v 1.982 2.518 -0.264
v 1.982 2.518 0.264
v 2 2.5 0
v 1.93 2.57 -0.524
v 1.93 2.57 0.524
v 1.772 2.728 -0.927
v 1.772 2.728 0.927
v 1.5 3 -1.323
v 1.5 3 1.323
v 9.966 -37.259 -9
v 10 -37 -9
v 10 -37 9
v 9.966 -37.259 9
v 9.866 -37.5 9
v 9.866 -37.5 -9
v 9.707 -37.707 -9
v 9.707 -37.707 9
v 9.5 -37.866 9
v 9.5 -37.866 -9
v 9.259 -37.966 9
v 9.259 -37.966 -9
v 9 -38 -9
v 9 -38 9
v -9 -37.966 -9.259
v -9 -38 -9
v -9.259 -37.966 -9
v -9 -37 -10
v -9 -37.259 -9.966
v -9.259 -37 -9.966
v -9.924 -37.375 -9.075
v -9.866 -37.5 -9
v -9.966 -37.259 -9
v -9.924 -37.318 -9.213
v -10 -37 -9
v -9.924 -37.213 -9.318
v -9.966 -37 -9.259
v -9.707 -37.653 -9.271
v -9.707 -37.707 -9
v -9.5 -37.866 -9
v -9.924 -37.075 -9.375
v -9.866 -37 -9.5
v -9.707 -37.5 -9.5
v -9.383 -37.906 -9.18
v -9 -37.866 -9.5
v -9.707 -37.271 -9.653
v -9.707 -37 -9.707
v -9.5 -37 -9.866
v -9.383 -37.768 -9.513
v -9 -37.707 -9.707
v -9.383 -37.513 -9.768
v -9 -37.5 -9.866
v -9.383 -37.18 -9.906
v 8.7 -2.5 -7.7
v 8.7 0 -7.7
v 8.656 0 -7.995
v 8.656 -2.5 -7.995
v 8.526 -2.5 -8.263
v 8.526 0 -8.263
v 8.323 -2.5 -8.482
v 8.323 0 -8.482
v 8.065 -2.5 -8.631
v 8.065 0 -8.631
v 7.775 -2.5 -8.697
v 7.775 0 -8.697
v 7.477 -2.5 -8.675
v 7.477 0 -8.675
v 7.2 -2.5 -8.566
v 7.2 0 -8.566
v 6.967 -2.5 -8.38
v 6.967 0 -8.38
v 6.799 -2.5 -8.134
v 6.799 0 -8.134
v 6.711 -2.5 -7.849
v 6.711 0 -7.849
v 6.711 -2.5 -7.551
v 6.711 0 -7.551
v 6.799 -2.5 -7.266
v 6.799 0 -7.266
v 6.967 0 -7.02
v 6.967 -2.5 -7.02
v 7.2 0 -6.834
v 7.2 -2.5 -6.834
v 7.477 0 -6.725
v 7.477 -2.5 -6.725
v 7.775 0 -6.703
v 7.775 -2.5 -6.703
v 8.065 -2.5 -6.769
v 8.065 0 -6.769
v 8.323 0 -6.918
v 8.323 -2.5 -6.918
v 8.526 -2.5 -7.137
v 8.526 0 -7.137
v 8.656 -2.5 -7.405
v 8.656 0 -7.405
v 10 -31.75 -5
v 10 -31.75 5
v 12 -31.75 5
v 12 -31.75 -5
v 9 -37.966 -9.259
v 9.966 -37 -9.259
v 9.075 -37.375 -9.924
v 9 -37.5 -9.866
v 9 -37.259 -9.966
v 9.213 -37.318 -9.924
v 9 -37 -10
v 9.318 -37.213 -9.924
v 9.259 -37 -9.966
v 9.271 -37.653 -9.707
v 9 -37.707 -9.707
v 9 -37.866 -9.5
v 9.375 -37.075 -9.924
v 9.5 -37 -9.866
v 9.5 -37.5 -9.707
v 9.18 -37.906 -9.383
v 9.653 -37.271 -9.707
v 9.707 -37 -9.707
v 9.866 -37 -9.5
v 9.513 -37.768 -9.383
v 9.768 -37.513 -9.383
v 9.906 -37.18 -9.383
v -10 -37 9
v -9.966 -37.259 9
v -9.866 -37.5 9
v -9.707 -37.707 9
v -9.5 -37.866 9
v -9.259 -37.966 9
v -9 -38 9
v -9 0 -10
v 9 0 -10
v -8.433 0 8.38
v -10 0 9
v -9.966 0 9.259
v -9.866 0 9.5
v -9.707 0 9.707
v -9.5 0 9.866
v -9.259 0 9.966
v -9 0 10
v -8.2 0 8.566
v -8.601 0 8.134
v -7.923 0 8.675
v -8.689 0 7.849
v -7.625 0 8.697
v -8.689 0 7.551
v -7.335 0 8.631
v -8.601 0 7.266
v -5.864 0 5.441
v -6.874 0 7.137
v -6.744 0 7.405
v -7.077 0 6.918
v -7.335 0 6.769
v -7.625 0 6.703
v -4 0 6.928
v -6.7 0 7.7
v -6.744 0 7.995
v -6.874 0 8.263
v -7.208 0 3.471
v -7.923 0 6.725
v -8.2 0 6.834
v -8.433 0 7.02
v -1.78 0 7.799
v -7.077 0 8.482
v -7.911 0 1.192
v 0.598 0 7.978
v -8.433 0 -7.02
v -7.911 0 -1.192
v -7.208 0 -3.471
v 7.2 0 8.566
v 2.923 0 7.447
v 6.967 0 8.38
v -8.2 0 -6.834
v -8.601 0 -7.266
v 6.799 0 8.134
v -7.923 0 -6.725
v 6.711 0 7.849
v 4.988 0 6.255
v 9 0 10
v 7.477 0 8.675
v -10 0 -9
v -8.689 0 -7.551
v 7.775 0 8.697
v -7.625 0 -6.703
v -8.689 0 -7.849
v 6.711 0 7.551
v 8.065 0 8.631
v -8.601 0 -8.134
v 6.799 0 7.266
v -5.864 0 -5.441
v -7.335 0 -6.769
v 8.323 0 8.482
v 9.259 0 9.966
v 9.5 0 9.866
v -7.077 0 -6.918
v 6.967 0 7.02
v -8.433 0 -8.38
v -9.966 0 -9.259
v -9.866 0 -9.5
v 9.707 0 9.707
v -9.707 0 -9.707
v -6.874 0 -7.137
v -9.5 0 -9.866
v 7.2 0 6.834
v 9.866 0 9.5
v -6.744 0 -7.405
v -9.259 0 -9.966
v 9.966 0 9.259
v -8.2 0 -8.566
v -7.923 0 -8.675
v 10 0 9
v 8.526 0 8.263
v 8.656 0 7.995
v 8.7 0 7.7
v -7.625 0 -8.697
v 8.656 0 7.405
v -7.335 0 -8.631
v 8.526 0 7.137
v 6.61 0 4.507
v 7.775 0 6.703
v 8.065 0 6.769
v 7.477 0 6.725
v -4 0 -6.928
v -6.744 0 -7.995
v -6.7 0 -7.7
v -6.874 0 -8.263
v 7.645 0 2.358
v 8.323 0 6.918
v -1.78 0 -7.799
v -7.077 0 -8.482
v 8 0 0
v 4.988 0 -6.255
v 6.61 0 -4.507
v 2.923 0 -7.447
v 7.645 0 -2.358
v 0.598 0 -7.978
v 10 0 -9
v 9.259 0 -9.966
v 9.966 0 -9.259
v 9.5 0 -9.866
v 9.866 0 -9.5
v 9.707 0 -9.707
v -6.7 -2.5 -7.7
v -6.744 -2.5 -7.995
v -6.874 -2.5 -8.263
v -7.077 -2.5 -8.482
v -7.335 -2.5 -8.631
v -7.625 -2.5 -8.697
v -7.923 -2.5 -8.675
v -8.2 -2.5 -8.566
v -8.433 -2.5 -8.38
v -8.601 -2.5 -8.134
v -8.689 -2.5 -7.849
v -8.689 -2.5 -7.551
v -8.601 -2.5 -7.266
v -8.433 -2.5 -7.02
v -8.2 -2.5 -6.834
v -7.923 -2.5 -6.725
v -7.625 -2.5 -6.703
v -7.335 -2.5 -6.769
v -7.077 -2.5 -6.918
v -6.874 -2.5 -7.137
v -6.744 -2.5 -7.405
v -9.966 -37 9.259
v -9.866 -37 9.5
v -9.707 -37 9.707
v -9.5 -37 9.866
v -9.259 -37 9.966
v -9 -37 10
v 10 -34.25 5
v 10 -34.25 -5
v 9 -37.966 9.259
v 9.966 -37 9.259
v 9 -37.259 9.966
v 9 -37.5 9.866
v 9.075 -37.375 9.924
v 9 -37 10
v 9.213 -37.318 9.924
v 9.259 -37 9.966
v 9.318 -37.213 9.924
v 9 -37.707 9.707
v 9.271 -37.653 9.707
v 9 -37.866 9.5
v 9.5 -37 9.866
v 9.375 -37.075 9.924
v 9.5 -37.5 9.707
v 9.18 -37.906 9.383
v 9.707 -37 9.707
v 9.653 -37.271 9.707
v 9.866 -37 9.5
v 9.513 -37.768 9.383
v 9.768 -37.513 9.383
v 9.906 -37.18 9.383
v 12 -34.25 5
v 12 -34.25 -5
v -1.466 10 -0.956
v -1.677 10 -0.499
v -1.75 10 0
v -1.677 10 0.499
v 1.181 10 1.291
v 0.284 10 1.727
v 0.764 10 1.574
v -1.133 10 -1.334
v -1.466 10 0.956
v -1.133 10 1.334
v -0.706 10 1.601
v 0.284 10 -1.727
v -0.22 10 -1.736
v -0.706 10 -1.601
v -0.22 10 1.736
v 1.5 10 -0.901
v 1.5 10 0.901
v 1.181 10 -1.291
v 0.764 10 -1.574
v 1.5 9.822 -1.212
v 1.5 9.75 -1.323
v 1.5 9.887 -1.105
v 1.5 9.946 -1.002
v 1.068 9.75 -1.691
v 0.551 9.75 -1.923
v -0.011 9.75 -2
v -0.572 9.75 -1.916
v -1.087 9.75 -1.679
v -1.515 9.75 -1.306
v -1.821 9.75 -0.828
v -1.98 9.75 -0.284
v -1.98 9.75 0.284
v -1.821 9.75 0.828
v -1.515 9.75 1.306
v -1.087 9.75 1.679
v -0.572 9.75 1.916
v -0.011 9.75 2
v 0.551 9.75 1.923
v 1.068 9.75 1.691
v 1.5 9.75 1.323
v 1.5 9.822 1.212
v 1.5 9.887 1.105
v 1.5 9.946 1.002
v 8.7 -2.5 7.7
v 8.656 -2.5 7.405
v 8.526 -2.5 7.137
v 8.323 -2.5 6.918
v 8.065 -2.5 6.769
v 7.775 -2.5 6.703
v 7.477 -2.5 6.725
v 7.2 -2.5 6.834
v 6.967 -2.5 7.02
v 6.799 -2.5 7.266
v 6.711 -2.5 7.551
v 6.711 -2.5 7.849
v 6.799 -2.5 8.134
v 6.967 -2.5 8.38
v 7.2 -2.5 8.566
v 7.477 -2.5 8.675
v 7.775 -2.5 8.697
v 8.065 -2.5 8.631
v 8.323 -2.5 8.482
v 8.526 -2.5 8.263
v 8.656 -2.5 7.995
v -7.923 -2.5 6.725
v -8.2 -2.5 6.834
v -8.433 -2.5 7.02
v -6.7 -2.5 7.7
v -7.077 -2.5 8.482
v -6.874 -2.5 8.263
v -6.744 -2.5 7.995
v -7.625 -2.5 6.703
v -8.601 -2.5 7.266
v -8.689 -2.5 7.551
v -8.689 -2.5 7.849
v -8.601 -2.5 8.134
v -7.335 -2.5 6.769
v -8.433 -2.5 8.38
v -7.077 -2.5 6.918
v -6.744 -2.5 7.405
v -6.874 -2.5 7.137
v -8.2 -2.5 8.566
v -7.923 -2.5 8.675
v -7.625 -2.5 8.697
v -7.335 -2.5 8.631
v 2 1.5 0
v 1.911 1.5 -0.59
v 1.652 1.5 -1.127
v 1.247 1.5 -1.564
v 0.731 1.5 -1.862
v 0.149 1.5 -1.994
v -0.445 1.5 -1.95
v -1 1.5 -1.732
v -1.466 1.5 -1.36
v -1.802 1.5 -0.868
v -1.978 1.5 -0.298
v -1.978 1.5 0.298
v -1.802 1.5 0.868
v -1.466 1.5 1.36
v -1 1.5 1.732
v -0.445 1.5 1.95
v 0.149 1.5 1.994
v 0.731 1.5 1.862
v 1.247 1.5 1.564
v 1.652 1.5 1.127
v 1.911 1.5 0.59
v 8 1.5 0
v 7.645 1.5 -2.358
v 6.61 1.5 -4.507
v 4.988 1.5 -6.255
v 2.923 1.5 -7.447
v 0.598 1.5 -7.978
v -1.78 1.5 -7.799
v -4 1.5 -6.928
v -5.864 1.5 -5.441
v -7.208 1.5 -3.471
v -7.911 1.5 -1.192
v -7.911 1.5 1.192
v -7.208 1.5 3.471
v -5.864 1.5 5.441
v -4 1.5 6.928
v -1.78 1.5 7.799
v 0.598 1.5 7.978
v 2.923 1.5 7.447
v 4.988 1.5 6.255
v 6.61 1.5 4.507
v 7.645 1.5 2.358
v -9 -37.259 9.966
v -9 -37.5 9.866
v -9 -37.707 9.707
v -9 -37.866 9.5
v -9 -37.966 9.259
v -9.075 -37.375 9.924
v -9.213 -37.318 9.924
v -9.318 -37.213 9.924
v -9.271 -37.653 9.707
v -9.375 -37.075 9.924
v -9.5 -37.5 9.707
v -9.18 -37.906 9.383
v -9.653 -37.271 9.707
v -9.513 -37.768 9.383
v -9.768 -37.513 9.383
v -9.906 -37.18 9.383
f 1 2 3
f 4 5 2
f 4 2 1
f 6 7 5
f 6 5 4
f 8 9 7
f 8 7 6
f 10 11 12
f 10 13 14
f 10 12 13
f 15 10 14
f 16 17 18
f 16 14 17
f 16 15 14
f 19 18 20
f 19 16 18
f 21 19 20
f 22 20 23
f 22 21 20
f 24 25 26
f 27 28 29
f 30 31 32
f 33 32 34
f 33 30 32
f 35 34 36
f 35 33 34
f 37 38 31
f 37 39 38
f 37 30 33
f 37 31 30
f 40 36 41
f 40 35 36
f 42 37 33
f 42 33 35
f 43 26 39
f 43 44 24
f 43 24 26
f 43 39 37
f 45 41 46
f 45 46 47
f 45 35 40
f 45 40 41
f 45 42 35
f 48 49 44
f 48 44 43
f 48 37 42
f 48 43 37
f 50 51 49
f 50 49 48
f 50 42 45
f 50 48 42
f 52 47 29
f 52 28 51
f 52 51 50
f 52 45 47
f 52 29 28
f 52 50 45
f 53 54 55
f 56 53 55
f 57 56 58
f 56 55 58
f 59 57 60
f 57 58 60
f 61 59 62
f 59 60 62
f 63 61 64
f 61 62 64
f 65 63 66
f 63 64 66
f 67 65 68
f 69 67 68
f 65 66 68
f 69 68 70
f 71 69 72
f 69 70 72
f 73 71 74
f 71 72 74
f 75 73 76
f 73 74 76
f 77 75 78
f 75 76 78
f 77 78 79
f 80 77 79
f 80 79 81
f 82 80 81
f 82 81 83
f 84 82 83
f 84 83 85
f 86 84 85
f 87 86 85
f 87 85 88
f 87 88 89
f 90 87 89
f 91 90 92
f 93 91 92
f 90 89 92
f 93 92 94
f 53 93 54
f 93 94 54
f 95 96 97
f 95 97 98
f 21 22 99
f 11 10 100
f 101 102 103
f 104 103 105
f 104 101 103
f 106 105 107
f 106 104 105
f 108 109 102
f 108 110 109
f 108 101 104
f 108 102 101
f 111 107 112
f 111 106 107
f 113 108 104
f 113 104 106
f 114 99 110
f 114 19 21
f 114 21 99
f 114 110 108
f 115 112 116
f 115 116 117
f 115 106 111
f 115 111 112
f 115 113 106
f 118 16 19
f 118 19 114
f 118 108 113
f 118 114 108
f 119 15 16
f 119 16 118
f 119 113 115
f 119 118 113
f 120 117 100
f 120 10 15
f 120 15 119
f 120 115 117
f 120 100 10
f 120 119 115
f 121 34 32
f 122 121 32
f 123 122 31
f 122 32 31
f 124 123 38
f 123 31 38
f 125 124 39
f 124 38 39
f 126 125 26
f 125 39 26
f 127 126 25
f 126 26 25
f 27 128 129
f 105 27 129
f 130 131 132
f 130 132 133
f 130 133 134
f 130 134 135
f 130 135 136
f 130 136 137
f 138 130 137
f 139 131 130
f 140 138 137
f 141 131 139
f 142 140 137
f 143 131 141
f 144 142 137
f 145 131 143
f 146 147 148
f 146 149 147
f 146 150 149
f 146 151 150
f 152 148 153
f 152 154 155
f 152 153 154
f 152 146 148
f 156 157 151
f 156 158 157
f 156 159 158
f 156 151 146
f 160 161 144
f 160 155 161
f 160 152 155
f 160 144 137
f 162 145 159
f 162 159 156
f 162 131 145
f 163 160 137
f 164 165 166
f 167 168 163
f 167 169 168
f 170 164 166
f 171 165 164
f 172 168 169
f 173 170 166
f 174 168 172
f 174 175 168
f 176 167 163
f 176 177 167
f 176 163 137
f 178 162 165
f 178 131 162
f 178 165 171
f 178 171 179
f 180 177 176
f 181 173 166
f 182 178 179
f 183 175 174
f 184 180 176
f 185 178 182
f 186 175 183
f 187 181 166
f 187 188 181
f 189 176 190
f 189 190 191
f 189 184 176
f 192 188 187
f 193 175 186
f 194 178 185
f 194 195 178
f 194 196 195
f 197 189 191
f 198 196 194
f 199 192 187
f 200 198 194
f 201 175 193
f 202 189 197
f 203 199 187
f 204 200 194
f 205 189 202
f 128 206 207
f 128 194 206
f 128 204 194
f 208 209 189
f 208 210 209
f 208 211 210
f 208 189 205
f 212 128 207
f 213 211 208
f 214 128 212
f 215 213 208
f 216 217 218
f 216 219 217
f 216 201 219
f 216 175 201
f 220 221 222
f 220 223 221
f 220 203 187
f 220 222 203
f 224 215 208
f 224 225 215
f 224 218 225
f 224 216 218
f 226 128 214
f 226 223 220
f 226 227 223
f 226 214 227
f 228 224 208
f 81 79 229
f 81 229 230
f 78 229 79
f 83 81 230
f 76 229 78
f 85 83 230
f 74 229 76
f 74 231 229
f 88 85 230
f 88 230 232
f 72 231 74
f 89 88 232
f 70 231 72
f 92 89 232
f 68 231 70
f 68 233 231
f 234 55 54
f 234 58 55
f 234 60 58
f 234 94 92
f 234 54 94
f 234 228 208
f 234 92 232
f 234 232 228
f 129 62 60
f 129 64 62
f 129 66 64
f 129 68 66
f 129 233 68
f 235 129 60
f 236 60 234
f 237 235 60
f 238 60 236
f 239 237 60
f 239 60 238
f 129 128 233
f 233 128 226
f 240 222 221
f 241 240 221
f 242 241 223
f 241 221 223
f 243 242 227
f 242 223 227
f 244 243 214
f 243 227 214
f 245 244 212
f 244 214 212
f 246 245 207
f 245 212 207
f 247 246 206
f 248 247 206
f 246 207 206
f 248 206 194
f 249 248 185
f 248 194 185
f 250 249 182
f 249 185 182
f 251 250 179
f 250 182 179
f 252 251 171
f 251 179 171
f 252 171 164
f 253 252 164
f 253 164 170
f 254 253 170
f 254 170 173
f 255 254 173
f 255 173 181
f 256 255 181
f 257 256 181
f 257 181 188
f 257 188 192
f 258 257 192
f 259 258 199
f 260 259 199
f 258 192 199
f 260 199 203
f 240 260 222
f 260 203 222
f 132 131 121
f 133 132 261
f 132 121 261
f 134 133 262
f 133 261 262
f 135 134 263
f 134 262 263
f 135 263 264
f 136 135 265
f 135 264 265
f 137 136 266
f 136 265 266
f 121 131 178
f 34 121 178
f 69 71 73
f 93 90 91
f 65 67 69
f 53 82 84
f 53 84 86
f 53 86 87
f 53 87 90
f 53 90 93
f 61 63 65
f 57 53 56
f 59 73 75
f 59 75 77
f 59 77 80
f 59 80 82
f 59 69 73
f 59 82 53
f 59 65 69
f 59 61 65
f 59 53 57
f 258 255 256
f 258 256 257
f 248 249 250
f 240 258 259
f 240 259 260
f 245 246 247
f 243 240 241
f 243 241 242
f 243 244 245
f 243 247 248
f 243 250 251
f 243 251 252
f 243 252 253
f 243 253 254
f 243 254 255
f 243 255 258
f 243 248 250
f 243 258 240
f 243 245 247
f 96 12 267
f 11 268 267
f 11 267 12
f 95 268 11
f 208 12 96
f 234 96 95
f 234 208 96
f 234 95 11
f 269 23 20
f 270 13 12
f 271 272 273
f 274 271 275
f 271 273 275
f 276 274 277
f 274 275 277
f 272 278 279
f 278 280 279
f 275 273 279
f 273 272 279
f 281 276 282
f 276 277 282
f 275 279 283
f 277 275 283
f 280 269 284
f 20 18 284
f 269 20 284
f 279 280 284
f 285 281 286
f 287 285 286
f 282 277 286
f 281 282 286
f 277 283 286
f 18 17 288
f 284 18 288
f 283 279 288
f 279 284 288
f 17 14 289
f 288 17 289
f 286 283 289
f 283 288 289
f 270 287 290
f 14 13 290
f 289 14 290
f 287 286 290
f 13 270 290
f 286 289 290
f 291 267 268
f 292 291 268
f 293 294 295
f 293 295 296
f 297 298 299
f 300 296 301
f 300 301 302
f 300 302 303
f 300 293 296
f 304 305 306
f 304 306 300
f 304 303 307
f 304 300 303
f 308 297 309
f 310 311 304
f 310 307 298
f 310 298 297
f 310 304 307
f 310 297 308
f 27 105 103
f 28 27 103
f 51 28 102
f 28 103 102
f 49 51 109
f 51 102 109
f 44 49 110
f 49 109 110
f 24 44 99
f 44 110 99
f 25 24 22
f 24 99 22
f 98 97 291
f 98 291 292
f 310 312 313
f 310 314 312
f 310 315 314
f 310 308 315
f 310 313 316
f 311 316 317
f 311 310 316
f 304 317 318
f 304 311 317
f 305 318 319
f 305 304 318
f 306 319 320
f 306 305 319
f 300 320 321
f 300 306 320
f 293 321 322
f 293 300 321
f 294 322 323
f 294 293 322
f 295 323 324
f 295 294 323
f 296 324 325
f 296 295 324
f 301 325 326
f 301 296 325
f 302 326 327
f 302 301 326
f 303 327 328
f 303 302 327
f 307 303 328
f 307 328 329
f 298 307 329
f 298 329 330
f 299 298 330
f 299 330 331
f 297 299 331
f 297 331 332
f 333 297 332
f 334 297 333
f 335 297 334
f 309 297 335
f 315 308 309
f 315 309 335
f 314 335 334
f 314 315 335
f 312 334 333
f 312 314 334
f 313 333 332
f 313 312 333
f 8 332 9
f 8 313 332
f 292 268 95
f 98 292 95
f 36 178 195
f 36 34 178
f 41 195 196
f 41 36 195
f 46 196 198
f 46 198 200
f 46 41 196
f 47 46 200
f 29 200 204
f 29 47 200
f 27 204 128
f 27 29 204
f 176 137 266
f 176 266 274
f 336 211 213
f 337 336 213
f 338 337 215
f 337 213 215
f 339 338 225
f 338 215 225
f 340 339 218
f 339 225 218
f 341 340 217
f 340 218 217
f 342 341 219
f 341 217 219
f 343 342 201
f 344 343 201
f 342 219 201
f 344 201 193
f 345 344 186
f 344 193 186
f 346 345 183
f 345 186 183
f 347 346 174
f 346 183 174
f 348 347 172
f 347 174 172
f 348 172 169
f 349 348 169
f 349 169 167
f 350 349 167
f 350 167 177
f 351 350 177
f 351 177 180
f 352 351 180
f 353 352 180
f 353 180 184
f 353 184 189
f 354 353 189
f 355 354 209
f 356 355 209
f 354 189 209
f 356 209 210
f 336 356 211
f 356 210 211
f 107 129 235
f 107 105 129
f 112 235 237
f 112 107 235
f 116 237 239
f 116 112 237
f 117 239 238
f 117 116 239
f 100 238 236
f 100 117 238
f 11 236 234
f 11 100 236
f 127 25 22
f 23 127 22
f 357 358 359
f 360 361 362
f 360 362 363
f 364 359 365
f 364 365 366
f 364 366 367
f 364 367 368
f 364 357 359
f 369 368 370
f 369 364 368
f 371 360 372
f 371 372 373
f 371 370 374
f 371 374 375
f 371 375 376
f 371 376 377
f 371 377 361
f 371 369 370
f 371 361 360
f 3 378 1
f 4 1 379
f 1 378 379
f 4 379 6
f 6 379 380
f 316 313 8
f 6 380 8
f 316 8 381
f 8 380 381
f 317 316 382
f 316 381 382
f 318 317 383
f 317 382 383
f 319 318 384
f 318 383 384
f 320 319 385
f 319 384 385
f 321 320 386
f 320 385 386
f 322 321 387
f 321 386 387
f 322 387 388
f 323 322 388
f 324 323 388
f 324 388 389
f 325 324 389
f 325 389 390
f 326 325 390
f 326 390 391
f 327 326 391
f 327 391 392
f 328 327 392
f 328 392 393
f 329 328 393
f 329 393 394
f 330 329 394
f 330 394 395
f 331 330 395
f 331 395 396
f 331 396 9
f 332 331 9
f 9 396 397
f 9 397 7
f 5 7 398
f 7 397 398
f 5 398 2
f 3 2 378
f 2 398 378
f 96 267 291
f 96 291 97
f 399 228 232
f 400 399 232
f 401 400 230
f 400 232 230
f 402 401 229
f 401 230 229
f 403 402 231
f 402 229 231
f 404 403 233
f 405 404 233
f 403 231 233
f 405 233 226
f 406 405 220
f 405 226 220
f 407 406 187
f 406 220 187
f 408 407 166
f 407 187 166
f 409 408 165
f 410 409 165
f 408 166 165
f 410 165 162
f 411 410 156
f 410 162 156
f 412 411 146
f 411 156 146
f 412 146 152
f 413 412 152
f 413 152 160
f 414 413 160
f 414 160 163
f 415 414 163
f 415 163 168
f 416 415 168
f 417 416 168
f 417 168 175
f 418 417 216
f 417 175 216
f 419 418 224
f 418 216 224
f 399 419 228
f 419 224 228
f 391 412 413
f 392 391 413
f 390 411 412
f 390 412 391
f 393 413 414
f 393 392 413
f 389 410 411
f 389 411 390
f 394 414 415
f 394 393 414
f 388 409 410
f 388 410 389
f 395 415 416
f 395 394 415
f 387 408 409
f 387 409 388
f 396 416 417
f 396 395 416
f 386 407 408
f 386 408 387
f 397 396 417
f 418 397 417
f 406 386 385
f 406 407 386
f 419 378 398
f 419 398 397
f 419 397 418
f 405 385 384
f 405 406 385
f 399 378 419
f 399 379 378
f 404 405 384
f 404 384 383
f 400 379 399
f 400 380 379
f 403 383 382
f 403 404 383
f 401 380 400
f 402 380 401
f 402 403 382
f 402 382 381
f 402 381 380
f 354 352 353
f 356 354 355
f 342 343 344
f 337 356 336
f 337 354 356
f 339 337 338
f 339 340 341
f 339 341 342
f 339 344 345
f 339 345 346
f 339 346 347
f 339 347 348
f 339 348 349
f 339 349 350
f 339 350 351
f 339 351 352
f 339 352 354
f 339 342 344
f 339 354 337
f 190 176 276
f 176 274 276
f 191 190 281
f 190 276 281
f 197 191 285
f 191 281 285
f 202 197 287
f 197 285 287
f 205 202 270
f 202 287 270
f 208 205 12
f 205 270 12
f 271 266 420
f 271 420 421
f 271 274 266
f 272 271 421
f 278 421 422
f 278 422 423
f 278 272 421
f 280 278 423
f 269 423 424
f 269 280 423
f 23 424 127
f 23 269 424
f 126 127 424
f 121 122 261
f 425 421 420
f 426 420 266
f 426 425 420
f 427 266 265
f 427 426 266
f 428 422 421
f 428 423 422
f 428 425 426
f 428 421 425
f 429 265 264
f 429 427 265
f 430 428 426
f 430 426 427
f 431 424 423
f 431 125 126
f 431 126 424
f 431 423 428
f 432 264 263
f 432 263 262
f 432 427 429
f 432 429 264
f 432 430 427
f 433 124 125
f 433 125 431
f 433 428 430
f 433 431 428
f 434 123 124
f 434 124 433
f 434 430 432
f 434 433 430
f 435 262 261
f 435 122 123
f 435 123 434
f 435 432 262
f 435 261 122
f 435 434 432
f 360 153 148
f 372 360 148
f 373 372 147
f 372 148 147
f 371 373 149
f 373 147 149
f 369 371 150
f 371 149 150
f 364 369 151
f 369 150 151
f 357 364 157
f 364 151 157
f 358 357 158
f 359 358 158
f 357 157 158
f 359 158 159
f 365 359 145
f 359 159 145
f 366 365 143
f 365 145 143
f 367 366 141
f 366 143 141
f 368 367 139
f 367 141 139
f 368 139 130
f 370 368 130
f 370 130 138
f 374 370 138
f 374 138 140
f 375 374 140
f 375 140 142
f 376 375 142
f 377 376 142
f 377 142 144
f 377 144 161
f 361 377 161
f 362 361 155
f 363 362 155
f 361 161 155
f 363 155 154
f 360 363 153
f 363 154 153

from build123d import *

# Parameters (mm, degrees)
SKETCH1_W               = 20
SKETCH1_H               = 20
BOSS_EXTRUDE1_DEPTH     = 38
SKETCH2_R               = 1
CUT_EXTRUDE1_DEPTH      = 2.5
SKETCH3_R               = 8
BOSS_EXTRUDE2_DEPTH     = 1.5
SKETCH4_R               = 2
BOSS_EXTRUDE3_DEPTH     = 10
CUT_EXTRUDE2_DEPTH      = 11
CUT_EXTRUDE2_DEPTH_BACK = 11
CHAMFER1_SIZE           = 0.25
FILLET1_R               = 1
SKETCH6_W               = 10
SKETCH6_H               = 2.5
BOSS_EXTRUDE4_DEPTH     = 12


with BuildPart() as part:
    # Sketch1 → Boss-Extrude1 (new body)
    with BuildSketch(Plane(origin=(0, 0, 0), x_dir=(1, 0, 0), z_dir=(0, 1, 0))):
        Rectangle(SKETCH1_W, SKETCH1_H)
    extrude(amount=-BOSS_EXTRUDE1_DEPTH)

    # Sketch2 → Cut-Extrude1 (cut)
    with BuildSketch(Plane(origin=(0, 0, 0), x_dir=(1, 0, 0), z_dir=(0, 1, 0))):
        with Locations((-7.7, 7.7)):
            Circle(SKETCH2_R)
        with Locations((7.7, 7.7)):
            Circle(SKETCH2_R)
        with Locations((7.7, -7.7)):
            Circle(SKETCH2_R)
        with Locations((-7.7, -7.7)):
            Circle(SKETCH2_R)
    extrude(amount=-CUT_EXTRUDE1_DEPTH, mode=Mode.SUBTRACT)

    # Sketch3 → Boss-Extrude2 (add)
    with BuildSketch(Plane(origin=(0, 0, 0), x_dir=(1, 0, 0), z_dir=(0, 1, 0))):
        Circle(SKETCH3_R)
    extrude(amount=BOSS_EXTRUDE2_DEPTH)

    # Sketch4 → Boss-Extrude3 (add)
    with BuildSketch(Plane(origin=(0, 0, 0), x_dir=(1, 0, 0), z_dir=(0, 1, 0))):
        Circle(SKETCH4_R)
    extrude(amount=BOSS_EXTRUDE3_DEPTH)

    # Sketch5 → Cut-Extrude2 (cut, two sides)
    with BuildSketch(Plane.XY) as cut_extrude2_sk:
        Polygon((2, 10), (1.5, 10), (1.5, 3), (2, 2.5), align=None)
    extrude(amount=CUT_EXTRUDE2_DEPTH, mode=Mode.SUBTRACT)
    extrude(cut_extrude2_sk.sketch, amount=-CUT_EXTRUDE2_DEPTH_BACK, mode=Mode.SUBTRACT)

    # Chamfer1
    chamfer1_edges = [part.edges().sort_by_distance(p)[0] for p in [
        (-2, 10, 0),
    ]]
    chamfer(chamfer1_edges, length=CHAMFER1_SIZE)

    # Fillet1
    fillet1_edges = [part.edges().sort_by_distance(p)[0] for p in [
        (10, -38, 0),
        (0, -38, -10),
        (-10, -38, 0),
        (0, -38, 10),
        (-10, -19, -10),
        (10, -19, -10),
        (10, -19, 10),
        (-10, -19, 10),
    ]]
    fillet(fillet1_edges, radius=FILLET1_R)

    # Sketch6 → Boss-Extrude4 (add)
    with BuildSketch(Plane(origin=(0, 0, 0), x_dir=(0, 0, -1), z_dir=(1, 0, 0))):
        with Locations((0, -33)):
            Rectangle(SKETCH6_W, SKETCH6_H)
    extrude(amount=BOSS_EXTRUDE4_DEPTH)


solid = part.part
